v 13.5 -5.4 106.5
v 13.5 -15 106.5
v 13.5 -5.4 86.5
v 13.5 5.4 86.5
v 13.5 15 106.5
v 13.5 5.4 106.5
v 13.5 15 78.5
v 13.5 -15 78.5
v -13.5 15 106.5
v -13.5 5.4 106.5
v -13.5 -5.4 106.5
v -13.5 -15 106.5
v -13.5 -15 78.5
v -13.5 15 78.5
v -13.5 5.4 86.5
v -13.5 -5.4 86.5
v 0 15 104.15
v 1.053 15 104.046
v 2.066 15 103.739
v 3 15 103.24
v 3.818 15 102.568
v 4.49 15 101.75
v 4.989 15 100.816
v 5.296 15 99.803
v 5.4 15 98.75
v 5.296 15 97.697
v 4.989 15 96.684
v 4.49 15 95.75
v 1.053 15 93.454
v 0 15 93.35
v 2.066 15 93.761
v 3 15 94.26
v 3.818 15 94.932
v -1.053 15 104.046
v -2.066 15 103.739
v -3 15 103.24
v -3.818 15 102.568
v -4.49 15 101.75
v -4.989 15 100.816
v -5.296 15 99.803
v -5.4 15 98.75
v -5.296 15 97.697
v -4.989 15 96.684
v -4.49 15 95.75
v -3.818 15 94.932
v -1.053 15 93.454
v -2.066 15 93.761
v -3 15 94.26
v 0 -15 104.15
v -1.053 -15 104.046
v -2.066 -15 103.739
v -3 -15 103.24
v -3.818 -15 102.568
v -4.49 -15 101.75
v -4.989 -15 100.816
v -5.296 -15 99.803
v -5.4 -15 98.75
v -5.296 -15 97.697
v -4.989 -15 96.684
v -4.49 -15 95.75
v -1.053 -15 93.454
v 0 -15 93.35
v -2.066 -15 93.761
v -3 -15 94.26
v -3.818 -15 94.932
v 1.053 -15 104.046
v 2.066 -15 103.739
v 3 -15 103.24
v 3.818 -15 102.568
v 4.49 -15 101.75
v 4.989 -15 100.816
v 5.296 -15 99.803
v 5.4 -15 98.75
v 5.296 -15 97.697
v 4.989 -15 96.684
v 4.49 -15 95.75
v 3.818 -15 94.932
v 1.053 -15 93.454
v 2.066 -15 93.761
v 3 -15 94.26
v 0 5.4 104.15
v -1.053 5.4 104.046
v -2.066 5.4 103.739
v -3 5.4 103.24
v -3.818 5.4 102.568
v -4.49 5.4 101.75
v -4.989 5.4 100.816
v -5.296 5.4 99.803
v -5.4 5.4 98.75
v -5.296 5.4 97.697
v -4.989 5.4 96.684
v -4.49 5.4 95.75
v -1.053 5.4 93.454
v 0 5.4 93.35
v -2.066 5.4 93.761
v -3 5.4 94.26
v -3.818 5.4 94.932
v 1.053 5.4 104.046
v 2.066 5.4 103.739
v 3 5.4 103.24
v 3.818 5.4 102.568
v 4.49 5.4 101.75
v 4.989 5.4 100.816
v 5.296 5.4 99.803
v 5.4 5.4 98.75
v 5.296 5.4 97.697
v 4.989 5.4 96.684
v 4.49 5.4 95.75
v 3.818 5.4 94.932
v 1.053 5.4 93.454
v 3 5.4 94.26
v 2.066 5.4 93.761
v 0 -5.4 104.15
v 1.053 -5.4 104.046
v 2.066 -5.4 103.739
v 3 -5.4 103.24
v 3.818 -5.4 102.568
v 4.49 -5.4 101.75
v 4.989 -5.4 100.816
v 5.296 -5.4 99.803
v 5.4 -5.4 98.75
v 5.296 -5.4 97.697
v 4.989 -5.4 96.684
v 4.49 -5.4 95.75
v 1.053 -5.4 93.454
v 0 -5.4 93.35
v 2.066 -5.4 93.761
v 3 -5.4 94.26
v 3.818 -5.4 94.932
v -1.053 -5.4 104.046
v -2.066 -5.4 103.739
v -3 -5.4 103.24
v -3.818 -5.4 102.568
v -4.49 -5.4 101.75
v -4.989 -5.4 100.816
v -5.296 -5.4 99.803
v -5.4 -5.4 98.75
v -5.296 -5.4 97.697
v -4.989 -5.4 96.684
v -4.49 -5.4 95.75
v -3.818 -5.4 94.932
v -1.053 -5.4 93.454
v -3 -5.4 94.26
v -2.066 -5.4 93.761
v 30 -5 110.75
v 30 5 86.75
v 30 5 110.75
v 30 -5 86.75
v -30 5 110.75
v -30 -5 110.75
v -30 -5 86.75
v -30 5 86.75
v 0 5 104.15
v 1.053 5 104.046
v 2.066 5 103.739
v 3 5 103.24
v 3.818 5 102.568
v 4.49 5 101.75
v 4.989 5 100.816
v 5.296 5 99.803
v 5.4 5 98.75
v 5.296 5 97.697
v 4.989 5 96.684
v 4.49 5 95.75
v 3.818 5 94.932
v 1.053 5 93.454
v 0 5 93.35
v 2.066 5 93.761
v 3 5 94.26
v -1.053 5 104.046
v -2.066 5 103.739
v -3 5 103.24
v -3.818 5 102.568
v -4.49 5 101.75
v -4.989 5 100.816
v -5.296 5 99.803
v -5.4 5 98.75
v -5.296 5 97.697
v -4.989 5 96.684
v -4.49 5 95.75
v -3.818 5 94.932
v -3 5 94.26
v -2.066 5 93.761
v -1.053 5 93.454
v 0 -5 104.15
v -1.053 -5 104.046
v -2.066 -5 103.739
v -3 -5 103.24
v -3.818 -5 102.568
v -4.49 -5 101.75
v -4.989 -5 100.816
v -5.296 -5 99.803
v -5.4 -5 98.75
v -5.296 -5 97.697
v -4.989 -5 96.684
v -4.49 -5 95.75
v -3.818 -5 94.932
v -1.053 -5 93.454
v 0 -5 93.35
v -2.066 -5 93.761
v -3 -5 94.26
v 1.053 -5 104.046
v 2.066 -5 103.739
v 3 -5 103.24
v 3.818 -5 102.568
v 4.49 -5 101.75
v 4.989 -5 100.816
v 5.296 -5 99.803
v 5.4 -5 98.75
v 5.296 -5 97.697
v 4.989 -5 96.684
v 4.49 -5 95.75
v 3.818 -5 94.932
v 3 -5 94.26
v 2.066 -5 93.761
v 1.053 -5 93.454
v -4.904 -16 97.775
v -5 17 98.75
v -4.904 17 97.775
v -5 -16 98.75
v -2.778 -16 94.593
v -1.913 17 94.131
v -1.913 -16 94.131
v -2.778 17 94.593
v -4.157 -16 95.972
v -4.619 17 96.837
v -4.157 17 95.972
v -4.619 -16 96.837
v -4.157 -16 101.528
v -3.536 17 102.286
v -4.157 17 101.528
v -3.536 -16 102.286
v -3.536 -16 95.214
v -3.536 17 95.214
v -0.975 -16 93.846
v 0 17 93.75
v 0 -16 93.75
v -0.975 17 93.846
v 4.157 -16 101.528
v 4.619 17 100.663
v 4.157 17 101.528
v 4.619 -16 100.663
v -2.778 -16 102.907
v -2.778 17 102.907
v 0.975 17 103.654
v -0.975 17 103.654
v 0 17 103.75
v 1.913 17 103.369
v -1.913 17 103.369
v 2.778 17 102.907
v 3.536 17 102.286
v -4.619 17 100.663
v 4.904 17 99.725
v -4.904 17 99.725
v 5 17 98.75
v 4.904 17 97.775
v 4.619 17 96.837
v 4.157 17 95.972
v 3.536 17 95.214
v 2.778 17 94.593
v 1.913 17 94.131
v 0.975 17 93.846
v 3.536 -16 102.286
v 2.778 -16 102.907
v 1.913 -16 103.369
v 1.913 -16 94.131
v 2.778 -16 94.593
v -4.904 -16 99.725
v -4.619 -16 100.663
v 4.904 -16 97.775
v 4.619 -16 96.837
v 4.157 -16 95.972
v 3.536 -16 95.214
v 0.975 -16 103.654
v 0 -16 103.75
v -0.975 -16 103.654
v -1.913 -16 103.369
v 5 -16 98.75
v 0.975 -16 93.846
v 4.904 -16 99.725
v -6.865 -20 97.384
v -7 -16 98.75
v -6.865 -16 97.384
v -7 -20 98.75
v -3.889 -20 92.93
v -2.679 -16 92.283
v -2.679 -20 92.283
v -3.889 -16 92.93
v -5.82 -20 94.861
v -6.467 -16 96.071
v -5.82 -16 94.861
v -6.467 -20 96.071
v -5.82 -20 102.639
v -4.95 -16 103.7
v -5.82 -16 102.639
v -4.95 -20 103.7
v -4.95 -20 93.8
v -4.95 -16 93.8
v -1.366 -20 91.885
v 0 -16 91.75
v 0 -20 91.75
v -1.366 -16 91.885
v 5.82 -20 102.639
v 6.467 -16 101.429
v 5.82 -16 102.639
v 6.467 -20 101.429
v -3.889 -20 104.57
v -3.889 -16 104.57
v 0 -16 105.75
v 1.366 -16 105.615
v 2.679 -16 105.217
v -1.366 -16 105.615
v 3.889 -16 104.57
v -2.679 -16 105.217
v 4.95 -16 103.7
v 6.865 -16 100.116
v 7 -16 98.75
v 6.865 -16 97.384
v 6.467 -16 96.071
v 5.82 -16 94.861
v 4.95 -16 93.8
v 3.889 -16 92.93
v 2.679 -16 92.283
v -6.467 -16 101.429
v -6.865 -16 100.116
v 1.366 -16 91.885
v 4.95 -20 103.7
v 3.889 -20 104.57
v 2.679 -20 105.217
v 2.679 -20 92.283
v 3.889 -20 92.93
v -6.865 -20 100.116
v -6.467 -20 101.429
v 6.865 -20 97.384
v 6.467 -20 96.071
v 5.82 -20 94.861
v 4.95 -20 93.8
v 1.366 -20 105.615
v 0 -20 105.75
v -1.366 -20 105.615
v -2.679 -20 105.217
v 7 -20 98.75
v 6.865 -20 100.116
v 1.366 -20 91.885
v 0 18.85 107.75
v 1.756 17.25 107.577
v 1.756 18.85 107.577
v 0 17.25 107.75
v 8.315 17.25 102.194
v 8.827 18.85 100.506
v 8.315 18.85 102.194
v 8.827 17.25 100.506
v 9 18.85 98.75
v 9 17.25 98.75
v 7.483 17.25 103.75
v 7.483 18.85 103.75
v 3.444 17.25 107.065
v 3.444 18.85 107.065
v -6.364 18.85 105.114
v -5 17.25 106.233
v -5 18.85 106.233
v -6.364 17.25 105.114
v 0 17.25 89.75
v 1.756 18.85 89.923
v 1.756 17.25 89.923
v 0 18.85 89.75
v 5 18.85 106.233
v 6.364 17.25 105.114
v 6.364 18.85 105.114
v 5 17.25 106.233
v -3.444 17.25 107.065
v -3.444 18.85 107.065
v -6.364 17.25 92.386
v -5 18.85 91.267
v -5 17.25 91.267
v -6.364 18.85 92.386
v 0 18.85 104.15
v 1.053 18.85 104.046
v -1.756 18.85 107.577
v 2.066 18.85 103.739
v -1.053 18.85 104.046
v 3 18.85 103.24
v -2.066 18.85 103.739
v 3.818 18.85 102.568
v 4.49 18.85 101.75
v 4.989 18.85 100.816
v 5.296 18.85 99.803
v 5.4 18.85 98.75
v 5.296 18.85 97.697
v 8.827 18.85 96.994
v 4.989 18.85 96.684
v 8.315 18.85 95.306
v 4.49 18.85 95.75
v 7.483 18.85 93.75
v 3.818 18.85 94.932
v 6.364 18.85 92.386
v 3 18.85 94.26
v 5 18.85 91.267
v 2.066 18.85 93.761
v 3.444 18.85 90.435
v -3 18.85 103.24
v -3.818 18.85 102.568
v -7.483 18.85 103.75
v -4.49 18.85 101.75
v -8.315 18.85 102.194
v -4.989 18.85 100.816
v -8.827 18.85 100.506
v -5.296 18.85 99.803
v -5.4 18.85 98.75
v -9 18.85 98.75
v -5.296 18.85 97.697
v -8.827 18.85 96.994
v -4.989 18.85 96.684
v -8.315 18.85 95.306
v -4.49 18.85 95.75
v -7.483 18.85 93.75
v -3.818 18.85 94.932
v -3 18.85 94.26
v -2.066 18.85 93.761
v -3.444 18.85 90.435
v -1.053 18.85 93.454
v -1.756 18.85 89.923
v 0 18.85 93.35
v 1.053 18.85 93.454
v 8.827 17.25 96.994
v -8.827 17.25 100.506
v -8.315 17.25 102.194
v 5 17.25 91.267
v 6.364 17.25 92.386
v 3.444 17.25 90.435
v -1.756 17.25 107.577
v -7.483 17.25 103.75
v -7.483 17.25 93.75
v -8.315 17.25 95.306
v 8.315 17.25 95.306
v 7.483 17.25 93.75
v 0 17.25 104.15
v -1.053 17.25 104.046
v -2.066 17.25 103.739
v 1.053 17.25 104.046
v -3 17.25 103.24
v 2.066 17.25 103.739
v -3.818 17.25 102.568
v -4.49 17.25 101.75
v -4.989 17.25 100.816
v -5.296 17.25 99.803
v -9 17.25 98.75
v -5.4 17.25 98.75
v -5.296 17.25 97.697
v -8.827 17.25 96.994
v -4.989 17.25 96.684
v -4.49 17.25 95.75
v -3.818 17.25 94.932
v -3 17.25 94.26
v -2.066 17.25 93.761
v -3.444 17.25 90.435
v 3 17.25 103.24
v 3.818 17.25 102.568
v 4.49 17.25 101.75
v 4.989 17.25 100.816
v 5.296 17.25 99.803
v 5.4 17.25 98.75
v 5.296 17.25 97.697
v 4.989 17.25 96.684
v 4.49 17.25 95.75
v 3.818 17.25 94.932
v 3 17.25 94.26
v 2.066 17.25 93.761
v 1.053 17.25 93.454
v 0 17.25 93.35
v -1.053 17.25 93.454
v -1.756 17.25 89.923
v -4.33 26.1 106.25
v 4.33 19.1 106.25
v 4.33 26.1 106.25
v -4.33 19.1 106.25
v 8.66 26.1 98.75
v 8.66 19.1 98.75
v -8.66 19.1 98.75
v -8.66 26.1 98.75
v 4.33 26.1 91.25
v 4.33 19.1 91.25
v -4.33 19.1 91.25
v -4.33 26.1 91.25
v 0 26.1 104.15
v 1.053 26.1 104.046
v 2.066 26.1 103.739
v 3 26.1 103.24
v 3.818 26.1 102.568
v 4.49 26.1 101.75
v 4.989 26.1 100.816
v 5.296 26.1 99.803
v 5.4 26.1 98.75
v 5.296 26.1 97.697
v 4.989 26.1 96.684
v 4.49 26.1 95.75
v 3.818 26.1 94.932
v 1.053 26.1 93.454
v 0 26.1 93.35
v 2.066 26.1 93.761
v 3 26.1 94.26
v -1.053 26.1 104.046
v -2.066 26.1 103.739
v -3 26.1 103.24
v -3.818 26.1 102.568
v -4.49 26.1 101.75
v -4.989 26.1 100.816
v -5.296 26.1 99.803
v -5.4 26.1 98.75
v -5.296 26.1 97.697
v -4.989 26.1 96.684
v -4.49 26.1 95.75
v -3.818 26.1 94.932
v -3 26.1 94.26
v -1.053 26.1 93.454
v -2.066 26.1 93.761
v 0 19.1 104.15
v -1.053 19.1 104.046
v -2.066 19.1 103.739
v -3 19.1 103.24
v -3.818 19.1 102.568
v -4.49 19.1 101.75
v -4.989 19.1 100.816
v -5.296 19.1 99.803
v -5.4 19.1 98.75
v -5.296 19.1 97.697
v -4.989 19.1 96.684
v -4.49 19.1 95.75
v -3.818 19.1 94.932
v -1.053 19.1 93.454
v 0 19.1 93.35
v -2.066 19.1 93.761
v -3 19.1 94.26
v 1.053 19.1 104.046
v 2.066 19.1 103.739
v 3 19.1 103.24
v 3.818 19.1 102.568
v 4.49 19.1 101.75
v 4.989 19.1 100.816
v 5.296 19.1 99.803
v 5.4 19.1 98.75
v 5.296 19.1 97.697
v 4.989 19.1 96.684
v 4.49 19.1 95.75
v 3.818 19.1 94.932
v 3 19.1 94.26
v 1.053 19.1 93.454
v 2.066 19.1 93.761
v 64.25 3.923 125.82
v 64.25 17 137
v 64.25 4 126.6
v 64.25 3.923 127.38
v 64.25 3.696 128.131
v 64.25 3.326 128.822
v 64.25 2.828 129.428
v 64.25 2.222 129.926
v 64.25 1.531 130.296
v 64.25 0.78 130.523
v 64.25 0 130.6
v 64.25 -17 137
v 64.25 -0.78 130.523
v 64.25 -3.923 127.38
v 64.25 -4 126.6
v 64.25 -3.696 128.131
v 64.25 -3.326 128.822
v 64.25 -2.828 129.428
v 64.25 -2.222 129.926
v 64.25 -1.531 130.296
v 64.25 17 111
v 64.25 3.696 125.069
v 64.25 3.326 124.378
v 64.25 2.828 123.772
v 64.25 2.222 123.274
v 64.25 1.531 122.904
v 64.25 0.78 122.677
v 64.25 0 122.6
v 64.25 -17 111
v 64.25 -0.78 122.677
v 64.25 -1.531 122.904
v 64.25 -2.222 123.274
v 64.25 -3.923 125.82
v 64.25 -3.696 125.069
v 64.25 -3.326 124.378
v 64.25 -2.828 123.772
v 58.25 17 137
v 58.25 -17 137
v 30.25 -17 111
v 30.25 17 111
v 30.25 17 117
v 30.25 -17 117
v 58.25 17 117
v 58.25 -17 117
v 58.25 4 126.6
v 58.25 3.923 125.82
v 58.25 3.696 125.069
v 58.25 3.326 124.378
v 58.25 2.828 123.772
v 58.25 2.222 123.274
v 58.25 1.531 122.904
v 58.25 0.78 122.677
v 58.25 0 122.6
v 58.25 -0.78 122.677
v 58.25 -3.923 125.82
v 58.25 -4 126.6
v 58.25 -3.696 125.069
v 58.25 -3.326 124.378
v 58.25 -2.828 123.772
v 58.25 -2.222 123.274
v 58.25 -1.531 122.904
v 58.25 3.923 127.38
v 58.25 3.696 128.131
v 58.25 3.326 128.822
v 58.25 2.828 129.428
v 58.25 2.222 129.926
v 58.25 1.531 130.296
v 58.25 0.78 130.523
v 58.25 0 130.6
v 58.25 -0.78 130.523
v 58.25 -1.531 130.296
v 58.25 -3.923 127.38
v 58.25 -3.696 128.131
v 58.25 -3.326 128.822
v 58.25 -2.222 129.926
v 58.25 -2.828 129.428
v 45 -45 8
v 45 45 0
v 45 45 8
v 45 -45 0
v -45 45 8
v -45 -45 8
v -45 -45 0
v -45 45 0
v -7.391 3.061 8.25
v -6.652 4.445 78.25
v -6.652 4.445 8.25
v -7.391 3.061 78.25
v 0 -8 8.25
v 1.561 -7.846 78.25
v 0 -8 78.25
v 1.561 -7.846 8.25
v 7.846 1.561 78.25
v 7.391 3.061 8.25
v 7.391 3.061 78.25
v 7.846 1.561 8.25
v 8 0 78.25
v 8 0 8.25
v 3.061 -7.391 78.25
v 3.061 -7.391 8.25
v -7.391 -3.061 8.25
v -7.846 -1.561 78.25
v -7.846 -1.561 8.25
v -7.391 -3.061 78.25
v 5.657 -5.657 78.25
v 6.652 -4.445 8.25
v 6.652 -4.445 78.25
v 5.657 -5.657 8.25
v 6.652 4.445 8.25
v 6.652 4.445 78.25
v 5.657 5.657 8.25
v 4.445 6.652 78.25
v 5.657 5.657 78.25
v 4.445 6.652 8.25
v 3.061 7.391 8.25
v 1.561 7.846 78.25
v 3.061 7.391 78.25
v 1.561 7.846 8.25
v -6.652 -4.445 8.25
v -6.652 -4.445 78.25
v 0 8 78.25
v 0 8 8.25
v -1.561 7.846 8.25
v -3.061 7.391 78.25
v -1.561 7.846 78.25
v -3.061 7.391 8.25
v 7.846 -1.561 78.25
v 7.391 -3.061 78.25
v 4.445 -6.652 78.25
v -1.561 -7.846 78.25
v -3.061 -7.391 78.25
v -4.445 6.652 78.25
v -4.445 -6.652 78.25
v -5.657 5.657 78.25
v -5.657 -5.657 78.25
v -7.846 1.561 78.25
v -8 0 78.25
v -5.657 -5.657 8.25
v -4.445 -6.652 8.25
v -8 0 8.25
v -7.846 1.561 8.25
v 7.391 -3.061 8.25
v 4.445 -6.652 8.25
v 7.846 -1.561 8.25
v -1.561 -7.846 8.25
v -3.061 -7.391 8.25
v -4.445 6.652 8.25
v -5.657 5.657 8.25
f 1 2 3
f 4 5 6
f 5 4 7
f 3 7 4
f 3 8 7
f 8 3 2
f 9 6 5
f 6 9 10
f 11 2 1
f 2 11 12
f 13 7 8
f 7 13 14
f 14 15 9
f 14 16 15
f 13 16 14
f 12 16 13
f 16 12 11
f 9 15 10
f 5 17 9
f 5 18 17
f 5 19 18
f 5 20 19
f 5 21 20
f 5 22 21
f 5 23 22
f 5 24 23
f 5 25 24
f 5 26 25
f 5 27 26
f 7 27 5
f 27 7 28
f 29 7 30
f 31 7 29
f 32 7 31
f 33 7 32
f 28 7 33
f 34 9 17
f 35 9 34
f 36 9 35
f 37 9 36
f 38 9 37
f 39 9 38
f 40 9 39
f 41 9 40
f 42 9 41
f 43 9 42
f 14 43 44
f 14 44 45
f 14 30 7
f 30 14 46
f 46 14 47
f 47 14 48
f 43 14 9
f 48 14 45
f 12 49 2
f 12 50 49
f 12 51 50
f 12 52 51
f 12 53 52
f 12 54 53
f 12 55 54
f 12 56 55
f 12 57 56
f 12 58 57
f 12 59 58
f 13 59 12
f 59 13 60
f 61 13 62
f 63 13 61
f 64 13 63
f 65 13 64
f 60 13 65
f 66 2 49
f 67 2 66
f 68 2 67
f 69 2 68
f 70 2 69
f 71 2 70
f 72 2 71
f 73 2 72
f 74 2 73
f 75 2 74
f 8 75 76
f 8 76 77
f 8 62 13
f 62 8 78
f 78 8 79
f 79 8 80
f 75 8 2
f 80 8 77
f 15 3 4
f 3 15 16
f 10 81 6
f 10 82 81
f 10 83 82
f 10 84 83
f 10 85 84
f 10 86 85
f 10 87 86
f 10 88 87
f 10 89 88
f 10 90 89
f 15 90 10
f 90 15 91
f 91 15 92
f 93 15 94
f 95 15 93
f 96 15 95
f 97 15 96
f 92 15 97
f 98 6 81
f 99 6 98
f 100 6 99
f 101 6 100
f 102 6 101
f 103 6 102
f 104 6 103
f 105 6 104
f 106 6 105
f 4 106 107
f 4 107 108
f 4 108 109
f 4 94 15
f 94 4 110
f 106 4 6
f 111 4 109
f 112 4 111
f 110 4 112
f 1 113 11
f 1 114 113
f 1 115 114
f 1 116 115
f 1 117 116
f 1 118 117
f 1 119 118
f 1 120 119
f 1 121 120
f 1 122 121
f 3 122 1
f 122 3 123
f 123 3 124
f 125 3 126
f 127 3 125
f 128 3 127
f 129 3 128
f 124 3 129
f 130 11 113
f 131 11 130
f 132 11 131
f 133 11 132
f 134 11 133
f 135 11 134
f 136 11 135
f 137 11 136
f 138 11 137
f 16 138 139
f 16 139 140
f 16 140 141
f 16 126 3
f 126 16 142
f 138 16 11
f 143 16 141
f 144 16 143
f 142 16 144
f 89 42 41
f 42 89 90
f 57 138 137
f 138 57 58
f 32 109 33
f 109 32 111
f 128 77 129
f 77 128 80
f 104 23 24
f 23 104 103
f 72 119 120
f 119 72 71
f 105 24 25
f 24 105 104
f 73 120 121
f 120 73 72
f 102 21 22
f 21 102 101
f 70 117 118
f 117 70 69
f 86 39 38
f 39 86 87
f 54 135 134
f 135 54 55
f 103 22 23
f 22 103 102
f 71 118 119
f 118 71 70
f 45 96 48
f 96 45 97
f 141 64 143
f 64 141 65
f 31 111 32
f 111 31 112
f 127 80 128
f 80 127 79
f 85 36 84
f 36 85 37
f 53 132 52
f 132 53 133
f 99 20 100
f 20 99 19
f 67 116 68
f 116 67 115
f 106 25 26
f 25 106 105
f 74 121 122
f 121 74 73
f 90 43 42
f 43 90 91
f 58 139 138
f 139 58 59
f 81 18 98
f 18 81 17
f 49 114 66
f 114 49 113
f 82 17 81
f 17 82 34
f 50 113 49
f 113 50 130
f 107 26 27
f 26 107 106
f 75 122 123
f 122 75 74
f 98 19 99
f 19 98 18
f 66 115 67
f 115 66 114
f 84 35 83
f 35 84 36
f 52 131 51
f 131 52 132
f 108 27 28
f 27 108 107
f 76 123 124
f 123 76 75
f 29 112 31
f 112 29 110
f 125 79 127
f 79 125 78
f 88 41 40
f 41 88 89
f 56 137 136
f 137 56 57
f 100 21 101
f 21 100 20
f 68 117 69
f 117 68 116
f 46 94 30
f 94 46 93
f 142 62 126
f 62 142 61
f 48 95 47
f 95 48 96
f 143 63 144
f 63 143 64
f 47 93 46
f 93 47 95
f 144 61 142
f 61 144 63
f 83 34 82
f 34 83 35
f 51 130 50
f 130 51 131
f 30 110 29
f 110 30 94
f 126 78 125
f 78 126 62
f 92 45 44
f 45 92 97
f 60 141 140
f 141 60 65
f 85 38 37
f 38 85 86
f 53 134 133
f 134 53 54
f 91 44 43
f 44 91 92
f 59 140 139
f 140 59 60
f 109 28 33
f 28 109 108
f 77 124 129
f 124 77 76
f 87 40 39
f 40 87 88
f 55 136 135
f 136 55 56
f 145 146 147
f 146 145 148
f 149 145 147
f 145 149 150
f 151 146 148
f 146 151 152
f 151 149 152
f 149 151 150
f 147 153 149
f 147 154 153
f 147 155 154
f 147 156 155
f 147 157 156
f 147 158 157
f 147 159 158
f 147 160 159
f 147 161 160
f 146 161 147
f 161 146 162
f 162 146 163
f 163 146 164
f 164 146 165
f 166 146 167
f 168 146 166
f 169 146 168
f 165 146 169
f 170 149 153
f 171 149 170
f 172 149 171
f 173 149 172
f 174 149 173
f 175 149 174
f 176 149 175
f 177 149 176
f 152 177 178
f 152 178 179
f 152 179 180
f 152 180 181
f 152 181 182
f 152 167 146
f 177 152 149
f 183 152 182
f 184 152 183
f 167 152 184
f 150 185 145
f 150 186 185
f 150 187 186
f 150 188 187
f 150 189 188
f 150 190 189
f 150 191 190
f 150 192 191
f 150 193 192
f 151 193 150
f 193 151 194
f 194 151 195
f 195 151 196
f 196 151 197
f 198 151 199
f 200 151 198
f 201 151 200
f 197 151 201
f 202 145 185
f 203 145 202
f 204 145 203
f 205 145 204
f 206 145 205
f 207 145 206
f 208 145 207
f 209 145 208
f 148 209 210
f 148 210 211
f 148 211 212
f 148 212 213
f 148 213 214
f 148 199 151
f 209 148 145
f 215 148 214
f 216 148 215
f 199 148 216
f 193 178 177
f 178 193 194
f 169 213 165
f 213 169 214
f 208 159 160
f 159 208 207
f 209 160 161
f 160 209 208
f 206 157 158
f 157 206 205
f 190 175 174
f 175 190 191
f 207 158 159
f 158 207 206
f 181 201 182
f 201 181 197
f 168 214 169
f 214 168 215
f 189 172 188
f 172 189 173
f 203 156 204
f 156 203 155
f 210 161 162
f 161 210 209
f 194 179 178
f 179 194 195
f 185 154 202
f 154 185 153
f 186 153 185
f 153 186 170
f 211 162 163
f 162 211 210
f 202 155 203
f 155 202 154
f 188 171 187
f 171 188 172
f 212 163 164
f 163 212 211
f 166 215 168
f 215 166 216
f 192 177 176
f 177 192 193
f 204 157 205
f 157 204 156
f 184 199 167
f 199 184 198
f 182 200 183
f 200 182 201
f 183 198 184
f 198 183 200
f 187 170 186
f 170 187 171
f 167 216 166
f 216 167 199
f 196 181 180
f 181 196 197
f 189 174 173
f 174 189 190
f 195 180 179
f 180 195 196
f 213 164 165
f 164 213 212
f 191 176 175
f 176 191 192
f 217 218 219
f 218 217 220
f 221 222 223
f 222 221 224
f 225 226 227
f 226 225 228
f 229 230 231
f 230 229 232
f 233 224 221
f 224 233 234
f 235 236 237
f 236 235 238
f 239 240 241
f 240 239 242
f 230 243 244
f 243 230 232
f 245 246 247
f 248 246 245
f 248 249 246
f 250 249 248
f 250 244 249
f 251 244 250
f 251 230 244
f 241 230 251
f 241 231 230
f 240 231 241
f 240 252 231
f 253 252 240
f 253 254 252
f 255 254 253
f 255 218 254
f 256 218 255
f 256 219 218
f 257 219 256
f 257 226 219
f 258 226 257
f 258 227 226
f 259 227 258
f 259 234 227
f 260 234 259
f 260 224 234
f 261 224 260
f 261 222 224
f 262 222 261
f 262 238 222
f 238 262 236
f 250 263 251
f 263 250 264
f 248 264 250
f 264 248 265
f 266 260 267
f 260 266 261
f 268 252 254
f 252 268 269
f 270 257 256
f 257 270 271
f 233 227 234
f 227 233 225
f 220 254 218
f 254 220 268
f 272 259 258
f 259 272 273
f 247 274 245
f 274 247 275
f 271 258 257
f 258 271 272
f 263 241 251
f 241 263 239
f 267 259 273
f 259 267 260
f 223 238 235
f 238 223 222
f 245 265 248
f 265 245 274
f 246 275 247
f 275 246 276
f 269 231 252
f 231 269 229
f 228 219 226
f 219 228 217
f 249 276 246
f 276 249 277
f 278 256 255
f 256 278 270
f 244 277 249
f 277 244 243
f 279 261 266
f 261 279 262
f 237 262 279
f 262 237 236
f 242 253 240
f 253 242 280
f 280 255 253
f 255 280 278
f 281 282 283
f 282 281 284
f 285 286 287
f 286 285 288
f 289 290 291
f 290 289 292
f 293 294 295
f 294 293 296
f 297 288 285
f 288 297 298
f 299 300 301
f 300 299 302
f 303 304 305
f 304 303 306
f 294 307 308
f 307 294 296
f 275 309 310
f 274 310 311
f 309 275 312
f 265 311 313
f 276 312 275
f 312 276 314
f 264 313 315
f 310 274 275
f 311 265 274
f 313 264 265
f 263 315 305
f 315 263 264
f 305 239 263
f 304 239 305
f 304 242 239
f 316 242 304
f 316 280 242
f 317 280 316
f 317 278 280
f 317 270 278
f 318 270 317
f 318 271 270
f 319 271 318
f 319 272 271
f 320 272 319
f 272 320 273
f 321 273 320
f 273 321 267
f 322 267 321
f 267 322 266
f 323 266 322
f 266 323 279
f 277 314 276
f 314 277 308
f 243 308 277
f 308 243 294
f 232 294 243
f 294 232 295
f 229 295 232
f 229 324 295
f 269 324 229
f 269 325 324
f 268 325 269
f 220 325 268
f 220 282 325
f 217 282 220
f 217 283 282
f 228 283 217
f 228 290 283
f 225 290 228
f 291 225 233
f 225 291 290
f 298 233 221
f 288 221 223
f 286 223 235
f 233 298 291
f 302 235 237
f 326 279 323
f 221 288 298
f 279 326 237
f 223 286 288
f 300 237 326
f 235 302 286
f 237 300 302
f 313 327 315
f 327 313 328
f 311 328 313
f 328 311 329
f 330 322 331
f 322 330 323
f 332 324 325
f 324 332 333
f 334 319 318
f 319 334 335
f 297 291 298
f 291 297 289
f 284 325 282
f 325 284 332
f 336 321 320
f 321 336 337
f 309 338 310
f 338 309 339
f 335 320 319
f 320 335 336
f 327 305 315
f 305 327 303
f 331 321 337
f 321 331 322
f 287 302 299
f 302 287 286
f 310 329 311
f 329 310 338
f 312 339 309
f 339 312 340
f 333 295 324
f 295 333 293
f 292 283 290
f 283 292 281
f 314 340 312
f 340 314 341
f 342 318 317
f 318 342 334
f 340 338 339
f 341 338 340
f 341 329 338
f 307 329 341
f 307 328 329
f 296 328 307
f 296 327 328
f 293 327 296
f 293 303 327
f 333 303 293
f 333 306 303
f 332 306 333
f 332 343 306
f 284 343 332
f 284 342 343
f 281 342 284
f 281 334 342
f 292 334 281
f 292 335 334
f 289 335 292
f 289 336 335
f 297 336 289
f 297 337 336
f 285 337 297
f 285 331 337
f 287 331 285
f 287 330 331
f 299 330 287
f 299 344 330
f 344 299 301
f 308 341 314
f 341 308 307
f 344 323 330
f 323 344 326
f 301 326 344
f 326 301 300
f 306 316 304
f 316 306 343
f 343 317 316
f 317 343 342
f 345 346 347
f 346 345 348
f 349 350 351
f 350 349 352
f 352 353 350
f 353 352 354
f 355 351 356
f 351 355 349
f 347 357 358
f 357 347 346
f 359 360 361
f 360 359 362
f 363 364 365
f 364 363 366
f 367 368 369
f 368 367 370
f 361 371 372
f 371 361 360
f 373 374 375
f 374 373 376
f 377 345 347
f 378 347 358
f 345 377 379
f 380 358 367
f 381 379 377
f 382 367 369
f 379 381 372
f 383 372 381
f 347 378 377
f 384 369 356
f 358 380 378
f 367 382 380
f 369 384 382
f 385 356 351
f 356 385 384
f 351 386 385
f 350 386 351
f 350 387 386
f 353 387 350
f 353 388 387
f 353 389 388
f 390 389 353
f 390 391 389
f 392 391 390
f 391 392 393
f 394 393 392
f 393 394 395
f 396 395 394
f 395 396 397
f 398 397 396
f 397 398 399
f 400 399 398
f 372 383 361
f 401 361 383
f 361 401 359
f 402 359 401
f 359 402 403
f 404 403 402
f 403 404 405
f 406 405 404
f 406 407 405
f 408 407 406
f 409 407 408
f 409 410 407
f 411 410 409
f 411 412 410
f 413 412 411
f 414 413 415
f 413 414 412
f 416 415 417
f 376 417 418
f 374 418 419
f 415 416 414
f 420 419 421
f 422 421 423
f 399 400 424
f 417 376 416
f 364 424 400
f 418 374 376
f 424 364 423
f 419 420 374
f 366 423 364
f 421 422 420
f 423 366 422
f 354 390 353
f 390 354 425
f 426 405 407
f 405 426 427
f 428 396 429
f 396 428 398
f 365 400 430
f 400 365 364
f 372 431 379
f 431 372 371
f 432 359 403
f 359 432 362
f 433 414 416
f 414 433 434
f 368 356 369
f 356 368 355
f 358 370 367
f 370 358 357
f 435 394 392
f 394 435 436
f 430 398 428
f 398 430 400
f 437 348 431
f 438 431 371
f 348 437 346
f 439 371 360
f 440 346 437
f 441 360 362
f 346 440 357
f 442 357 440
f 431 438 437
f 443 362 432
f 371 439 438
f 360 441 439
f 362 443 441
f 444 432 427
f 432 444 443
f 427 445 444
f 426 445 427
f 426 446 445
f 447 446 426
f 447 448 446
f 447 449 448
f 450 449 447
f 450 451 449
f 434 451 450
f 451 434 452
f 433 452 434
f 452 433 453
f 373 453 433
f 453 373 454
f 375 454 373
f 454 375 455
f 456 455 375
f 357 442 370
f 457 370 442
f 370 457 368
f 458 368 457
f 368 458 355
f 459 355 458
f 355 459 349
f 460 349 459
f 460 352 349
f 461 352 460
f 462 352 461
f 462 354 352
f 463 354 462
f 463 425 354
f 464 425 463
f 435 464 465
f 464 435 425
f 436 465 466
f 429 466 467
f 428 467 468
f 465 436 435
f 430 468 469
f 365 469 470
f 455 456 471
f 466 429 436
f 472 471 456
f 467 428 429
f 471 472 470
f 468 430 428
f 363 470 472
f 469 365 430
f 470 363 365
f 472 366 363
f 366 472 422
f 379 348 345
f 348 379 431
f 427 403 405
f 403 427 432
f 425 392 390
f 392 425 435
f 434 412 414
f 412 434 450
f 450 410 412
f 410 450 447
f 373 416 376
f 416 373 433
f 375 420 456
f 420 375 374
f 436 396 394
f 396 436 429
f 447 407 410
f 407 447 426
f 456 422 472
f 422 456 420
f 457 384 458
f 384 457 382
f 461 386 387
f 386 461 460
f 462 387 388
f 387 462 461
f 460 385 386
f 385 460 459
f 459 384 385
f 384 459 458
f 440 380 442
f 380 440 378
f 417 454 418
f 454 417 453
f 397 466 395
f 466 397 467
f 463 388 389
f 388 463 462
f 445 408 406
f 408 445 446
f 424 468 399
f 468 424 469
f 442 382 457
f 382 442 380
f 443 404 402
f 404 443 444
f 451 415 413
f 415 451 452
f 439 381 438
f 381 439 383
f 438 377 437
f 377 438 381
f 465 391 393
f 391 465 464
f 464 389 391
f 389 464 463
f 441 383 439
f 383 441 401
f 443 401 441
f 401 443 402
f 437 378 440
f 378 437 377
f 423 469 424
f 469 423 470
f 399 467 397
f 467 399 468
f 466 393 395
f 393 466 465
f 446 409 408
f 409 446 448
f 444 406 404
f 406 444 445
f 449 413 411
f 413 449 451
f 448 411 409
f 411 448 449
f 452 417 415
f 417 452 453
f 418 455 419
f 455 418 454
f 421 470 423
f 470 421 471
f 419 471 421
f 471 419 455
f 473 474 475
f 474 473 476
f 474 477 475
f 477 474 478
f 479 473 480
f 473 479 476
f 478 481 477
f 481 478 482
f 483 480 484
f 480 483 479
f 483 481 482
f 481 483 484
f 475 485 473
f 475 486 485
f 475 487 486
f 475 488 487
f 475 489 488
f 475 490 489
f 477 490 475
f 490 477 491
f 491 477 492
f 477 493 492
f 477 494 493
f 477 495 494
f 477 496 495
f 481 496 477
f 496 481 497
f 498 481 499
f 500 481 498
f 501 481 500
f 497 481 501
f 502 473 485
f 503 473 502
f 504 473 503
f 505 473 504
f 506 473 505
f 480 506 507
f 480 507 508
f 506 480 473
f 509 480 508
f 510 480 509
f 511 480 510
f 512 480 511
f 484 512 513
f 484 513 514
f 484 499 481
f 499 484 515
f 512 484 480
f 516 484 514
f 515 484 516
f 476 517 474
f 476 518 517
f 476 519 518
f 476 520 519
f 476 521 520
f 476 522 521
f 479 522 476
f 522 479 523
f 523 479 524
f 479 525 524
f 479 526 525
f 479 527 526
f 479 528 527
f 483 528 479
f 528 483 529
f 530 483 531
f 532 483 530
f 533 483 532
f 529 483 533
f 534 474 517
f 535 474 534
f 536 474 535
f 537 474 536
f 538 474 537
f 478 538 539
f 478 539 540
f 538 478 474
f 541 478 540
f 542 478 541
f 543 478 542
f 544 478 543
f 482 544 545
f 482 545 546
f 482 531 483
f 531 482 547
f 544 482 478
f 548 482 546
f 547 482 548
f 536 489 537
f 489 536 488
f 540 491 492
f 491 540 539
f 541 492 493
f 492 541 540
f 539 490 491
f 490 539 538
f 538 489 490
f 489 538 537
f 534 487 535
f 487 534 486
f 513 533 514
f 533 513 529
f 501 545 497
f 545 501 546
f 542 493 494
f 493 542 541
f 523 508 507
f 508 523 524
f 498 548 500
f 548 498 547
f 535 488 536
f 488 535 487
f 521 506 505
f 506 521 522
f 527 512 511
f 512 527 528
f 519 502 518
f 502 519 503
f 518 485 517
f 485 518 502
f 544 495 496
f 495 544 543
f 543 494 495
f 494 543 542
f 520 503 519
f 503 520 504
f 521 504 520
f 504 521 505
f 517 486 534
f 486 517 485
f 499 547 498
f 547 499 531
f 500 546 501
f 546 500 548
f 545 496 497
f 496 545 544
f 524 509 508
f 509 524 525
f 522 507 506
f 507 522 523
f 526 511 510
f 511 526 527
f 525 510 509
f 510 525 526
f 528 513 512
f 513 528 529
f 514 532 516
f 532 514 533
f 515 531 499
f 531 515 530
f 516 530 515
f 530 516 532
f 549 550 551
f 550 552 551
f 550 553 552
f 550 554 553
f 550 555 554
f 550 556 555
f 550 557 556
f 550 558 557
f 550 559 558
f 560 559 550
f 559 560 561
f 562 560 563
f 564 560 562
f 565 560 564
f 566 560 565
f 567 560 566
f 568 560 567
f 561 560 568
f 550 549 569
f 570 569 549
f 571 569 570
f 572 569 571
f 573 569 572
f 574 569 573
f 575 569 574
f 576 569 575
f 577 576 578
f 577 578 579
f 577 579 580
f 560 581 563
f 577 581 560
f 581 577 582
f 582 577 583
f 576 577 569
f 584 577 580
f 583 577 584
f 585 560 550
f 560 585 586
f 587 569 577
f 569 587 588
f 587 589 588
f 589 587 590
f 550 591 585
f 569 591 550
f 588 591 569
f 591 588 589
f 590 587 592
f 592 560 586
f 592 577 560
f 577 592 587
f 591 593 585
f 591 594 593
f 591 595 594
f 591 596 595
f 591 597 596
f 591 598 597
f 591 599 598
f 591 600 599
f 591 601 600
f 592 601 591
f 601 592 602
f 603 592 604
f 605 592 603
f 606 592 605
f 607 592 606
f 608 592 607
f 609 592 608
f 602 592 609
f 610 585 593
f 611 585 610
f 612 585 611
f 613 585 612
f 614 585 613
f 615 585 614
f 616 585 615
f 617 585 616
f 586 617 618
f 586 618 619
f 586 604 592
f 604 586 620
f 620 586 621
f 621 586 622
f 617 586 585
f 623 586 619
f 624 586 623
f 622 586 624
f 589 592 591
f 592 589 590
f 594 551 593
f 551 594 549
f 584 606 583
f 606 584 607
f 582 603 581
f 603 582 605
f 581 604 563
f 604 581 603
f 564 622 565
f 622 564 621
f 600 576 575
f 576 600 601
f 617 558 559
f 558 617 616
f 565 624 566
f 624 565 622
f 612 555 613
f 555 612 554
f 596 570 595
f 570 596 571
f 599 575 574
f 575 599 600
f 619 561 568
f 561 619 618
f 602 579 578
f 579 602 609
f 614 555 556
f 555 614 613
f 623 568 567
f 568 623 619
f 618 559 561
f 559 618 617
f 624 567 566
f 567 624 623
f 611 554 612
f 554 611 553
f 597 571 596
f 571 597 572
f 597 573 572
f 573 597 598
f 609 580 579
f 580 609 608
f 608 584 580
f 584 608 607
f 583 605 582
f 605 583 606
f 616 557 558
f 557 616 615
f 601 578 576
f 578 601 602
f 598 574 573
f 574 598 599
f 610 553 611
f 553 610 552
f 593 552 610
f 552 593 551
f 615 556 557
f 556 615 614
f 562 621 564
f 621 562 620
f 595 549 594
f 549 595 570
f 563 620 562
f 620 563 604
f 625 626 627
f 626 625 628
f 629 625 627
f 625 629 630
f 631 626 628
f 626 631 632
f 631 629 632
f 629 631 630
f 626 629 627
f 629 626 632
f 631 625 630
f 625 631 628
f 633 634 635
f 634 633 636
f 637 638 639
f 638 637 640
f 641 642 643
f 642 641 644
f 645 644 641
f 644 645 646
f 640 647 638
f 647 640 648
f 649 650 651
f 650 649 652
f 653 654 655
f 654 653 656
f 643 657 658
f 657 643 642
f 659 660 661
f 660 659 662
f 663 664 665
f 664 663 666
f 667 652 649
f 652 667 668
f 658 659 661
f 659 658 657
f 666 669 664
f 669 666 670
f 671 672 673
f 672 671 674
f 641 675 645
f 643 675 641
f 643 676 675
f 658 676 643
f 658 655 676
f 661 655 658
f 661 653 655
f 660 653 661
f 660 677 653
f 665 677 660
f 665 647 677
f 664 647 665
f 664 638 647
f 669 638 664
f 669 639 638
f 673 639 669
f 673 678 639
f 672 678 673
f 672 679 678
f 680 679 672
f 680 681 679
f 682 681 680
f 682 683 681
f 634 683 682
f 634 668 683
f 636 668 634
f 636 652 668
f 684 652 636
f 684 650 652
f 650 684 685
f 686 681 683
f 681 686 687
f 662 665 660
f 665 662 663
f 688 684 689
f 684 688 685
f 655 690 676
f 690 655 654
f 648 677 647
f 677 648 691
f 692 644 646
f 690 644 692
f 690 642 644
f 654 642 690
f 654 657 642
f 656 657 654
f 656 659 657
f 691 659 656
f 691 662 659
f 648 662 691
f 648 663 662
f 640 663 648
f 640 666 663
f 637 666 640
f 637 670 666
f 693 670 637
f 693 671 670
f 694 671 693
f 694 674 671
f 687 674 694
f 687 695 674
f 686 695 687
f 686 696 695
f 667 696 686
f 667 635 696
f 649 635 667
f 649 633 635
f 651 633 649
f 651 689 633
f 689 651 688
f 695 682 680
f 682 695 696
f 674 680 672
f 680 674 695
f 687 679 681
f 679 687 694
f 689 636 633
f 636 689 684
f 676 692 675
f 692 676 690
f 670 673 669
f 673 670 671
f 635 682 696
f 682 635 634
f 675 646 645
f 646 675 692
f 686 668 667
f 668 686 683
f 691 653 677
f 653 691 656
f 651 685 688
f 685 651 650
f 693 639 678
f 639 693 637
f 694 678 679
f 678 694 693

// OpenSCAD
$fn = 32;

// ------------------------------------------------------------------------
// Lamp arm: column d16 x 70 mm, arm 60 mm
// Every part is its own module, assembly() places every instance.
// ------------------------------------------------------------------------

// --- part 1 ---
module lamp_base() {
  difference() {
    translate([-45, -45, 0]) cube([90, 90, 8]);
  }
}

// --- part 2 ---
module lamp_column() {
  cylinder(h = 70, d = 16);
}

// --- part 3 ---
module head_fork() {
  difference() {
    translate([-13.5, -15, 0]) cube([27, 30, 28]);
    translate([-14.5, -5.4, 8]) cube([29, 10.8, 21]);
    translate([0, 0, 20.25]) rotate([90, 0, 0]) cylinder(h = 32, d = 10.8, center = true);
  }
}

// --- part 4 ---
module lamp_arm() {
  difference() {
    translate([-30, -5, 0]) cube([60, 10, 24]);
    translate([0, 0, 12]) rotate([90, 0, 0]) cylinder(h = 12, d = 10.8, center = true);
  }
}

// --- part 5 ---
module arm_pin() {
  rotate([0, 90, 0]) cylinder(h = 34, d = 10, center = true);
  translate([-20, 0, 0]) rotate([0, 90, 0]) cylinder(h = 4, d = 14);
}

// --- part 6 ---
module arm_washer() {
  difference() {
      translate([0, 0, 0]) cylinder(h = 1.6, d = 18);
      translate([0, 0, -1]) cylinder(h = 3.6, d = 10.8);
    }
}

// --- part 7 ---
module arm_nut() {
  difference() {
    linear_extrude(height = 7) polygon(points = [[8.66, 0], [4.33, 7.5], [-4.33, 7.5], [-8.66, 0], [-4.33, -7.5], [4.33, -7.5]]);
    translate([0, 0, -1]) cylinder(h = 9, d = 10.8);
  }
}

// --- part 8 ---
module shade_bracket() {
  difference() {
    translate([-17, -17, 0]) cube([34, 34, 26]);
    translate([-18, -18, 6]) cube([29, 36, 21]);
    translate([14, 0, 15.6]) rotate([0, 90, 0]) cylinder(h = 8, d = 8, center = true);
  }
}

// --- assembly ---
module assembly() {
  color([0.80, 0.24, 0.20]) translate([0, 0, 0]) rotate([0, 0, 0]) lamp_base();
  color([0.20, 0.45, 0.75]) translate([0, 0, 8.25]) rotate([0, 0, 0]) lamp_column();
  color([0.25, 0.62, 0.32]) translate([0, 0, 78.5]) rotate([0, 0, 0]) head_fork();
  color([0.92, 0.70, 0.18]) translate([0, 0, 86.75]) rotate([0, 0, 0]) lamp_arm();
  color([0.58, 0.35, 0.70]) translate([0, 0, 98.75]) rotate([0, 0, 90]) arm_pin();
  color([0.16, 0.66, 0.66]) translate([0, 18.85, 98.75]) rotate([90, 0, 0]) arm_washer();
  color([0.85, 0.48, 0.18]) translate([0, 26.1, 98.75]) rotate([90, 0, 0]) arm_nut();
  color([0.55, 0.60, 0.65]) translate([47.25, 0, 111]) rotate([0, 0, 0]) shade_bracket();
}

assembly();
